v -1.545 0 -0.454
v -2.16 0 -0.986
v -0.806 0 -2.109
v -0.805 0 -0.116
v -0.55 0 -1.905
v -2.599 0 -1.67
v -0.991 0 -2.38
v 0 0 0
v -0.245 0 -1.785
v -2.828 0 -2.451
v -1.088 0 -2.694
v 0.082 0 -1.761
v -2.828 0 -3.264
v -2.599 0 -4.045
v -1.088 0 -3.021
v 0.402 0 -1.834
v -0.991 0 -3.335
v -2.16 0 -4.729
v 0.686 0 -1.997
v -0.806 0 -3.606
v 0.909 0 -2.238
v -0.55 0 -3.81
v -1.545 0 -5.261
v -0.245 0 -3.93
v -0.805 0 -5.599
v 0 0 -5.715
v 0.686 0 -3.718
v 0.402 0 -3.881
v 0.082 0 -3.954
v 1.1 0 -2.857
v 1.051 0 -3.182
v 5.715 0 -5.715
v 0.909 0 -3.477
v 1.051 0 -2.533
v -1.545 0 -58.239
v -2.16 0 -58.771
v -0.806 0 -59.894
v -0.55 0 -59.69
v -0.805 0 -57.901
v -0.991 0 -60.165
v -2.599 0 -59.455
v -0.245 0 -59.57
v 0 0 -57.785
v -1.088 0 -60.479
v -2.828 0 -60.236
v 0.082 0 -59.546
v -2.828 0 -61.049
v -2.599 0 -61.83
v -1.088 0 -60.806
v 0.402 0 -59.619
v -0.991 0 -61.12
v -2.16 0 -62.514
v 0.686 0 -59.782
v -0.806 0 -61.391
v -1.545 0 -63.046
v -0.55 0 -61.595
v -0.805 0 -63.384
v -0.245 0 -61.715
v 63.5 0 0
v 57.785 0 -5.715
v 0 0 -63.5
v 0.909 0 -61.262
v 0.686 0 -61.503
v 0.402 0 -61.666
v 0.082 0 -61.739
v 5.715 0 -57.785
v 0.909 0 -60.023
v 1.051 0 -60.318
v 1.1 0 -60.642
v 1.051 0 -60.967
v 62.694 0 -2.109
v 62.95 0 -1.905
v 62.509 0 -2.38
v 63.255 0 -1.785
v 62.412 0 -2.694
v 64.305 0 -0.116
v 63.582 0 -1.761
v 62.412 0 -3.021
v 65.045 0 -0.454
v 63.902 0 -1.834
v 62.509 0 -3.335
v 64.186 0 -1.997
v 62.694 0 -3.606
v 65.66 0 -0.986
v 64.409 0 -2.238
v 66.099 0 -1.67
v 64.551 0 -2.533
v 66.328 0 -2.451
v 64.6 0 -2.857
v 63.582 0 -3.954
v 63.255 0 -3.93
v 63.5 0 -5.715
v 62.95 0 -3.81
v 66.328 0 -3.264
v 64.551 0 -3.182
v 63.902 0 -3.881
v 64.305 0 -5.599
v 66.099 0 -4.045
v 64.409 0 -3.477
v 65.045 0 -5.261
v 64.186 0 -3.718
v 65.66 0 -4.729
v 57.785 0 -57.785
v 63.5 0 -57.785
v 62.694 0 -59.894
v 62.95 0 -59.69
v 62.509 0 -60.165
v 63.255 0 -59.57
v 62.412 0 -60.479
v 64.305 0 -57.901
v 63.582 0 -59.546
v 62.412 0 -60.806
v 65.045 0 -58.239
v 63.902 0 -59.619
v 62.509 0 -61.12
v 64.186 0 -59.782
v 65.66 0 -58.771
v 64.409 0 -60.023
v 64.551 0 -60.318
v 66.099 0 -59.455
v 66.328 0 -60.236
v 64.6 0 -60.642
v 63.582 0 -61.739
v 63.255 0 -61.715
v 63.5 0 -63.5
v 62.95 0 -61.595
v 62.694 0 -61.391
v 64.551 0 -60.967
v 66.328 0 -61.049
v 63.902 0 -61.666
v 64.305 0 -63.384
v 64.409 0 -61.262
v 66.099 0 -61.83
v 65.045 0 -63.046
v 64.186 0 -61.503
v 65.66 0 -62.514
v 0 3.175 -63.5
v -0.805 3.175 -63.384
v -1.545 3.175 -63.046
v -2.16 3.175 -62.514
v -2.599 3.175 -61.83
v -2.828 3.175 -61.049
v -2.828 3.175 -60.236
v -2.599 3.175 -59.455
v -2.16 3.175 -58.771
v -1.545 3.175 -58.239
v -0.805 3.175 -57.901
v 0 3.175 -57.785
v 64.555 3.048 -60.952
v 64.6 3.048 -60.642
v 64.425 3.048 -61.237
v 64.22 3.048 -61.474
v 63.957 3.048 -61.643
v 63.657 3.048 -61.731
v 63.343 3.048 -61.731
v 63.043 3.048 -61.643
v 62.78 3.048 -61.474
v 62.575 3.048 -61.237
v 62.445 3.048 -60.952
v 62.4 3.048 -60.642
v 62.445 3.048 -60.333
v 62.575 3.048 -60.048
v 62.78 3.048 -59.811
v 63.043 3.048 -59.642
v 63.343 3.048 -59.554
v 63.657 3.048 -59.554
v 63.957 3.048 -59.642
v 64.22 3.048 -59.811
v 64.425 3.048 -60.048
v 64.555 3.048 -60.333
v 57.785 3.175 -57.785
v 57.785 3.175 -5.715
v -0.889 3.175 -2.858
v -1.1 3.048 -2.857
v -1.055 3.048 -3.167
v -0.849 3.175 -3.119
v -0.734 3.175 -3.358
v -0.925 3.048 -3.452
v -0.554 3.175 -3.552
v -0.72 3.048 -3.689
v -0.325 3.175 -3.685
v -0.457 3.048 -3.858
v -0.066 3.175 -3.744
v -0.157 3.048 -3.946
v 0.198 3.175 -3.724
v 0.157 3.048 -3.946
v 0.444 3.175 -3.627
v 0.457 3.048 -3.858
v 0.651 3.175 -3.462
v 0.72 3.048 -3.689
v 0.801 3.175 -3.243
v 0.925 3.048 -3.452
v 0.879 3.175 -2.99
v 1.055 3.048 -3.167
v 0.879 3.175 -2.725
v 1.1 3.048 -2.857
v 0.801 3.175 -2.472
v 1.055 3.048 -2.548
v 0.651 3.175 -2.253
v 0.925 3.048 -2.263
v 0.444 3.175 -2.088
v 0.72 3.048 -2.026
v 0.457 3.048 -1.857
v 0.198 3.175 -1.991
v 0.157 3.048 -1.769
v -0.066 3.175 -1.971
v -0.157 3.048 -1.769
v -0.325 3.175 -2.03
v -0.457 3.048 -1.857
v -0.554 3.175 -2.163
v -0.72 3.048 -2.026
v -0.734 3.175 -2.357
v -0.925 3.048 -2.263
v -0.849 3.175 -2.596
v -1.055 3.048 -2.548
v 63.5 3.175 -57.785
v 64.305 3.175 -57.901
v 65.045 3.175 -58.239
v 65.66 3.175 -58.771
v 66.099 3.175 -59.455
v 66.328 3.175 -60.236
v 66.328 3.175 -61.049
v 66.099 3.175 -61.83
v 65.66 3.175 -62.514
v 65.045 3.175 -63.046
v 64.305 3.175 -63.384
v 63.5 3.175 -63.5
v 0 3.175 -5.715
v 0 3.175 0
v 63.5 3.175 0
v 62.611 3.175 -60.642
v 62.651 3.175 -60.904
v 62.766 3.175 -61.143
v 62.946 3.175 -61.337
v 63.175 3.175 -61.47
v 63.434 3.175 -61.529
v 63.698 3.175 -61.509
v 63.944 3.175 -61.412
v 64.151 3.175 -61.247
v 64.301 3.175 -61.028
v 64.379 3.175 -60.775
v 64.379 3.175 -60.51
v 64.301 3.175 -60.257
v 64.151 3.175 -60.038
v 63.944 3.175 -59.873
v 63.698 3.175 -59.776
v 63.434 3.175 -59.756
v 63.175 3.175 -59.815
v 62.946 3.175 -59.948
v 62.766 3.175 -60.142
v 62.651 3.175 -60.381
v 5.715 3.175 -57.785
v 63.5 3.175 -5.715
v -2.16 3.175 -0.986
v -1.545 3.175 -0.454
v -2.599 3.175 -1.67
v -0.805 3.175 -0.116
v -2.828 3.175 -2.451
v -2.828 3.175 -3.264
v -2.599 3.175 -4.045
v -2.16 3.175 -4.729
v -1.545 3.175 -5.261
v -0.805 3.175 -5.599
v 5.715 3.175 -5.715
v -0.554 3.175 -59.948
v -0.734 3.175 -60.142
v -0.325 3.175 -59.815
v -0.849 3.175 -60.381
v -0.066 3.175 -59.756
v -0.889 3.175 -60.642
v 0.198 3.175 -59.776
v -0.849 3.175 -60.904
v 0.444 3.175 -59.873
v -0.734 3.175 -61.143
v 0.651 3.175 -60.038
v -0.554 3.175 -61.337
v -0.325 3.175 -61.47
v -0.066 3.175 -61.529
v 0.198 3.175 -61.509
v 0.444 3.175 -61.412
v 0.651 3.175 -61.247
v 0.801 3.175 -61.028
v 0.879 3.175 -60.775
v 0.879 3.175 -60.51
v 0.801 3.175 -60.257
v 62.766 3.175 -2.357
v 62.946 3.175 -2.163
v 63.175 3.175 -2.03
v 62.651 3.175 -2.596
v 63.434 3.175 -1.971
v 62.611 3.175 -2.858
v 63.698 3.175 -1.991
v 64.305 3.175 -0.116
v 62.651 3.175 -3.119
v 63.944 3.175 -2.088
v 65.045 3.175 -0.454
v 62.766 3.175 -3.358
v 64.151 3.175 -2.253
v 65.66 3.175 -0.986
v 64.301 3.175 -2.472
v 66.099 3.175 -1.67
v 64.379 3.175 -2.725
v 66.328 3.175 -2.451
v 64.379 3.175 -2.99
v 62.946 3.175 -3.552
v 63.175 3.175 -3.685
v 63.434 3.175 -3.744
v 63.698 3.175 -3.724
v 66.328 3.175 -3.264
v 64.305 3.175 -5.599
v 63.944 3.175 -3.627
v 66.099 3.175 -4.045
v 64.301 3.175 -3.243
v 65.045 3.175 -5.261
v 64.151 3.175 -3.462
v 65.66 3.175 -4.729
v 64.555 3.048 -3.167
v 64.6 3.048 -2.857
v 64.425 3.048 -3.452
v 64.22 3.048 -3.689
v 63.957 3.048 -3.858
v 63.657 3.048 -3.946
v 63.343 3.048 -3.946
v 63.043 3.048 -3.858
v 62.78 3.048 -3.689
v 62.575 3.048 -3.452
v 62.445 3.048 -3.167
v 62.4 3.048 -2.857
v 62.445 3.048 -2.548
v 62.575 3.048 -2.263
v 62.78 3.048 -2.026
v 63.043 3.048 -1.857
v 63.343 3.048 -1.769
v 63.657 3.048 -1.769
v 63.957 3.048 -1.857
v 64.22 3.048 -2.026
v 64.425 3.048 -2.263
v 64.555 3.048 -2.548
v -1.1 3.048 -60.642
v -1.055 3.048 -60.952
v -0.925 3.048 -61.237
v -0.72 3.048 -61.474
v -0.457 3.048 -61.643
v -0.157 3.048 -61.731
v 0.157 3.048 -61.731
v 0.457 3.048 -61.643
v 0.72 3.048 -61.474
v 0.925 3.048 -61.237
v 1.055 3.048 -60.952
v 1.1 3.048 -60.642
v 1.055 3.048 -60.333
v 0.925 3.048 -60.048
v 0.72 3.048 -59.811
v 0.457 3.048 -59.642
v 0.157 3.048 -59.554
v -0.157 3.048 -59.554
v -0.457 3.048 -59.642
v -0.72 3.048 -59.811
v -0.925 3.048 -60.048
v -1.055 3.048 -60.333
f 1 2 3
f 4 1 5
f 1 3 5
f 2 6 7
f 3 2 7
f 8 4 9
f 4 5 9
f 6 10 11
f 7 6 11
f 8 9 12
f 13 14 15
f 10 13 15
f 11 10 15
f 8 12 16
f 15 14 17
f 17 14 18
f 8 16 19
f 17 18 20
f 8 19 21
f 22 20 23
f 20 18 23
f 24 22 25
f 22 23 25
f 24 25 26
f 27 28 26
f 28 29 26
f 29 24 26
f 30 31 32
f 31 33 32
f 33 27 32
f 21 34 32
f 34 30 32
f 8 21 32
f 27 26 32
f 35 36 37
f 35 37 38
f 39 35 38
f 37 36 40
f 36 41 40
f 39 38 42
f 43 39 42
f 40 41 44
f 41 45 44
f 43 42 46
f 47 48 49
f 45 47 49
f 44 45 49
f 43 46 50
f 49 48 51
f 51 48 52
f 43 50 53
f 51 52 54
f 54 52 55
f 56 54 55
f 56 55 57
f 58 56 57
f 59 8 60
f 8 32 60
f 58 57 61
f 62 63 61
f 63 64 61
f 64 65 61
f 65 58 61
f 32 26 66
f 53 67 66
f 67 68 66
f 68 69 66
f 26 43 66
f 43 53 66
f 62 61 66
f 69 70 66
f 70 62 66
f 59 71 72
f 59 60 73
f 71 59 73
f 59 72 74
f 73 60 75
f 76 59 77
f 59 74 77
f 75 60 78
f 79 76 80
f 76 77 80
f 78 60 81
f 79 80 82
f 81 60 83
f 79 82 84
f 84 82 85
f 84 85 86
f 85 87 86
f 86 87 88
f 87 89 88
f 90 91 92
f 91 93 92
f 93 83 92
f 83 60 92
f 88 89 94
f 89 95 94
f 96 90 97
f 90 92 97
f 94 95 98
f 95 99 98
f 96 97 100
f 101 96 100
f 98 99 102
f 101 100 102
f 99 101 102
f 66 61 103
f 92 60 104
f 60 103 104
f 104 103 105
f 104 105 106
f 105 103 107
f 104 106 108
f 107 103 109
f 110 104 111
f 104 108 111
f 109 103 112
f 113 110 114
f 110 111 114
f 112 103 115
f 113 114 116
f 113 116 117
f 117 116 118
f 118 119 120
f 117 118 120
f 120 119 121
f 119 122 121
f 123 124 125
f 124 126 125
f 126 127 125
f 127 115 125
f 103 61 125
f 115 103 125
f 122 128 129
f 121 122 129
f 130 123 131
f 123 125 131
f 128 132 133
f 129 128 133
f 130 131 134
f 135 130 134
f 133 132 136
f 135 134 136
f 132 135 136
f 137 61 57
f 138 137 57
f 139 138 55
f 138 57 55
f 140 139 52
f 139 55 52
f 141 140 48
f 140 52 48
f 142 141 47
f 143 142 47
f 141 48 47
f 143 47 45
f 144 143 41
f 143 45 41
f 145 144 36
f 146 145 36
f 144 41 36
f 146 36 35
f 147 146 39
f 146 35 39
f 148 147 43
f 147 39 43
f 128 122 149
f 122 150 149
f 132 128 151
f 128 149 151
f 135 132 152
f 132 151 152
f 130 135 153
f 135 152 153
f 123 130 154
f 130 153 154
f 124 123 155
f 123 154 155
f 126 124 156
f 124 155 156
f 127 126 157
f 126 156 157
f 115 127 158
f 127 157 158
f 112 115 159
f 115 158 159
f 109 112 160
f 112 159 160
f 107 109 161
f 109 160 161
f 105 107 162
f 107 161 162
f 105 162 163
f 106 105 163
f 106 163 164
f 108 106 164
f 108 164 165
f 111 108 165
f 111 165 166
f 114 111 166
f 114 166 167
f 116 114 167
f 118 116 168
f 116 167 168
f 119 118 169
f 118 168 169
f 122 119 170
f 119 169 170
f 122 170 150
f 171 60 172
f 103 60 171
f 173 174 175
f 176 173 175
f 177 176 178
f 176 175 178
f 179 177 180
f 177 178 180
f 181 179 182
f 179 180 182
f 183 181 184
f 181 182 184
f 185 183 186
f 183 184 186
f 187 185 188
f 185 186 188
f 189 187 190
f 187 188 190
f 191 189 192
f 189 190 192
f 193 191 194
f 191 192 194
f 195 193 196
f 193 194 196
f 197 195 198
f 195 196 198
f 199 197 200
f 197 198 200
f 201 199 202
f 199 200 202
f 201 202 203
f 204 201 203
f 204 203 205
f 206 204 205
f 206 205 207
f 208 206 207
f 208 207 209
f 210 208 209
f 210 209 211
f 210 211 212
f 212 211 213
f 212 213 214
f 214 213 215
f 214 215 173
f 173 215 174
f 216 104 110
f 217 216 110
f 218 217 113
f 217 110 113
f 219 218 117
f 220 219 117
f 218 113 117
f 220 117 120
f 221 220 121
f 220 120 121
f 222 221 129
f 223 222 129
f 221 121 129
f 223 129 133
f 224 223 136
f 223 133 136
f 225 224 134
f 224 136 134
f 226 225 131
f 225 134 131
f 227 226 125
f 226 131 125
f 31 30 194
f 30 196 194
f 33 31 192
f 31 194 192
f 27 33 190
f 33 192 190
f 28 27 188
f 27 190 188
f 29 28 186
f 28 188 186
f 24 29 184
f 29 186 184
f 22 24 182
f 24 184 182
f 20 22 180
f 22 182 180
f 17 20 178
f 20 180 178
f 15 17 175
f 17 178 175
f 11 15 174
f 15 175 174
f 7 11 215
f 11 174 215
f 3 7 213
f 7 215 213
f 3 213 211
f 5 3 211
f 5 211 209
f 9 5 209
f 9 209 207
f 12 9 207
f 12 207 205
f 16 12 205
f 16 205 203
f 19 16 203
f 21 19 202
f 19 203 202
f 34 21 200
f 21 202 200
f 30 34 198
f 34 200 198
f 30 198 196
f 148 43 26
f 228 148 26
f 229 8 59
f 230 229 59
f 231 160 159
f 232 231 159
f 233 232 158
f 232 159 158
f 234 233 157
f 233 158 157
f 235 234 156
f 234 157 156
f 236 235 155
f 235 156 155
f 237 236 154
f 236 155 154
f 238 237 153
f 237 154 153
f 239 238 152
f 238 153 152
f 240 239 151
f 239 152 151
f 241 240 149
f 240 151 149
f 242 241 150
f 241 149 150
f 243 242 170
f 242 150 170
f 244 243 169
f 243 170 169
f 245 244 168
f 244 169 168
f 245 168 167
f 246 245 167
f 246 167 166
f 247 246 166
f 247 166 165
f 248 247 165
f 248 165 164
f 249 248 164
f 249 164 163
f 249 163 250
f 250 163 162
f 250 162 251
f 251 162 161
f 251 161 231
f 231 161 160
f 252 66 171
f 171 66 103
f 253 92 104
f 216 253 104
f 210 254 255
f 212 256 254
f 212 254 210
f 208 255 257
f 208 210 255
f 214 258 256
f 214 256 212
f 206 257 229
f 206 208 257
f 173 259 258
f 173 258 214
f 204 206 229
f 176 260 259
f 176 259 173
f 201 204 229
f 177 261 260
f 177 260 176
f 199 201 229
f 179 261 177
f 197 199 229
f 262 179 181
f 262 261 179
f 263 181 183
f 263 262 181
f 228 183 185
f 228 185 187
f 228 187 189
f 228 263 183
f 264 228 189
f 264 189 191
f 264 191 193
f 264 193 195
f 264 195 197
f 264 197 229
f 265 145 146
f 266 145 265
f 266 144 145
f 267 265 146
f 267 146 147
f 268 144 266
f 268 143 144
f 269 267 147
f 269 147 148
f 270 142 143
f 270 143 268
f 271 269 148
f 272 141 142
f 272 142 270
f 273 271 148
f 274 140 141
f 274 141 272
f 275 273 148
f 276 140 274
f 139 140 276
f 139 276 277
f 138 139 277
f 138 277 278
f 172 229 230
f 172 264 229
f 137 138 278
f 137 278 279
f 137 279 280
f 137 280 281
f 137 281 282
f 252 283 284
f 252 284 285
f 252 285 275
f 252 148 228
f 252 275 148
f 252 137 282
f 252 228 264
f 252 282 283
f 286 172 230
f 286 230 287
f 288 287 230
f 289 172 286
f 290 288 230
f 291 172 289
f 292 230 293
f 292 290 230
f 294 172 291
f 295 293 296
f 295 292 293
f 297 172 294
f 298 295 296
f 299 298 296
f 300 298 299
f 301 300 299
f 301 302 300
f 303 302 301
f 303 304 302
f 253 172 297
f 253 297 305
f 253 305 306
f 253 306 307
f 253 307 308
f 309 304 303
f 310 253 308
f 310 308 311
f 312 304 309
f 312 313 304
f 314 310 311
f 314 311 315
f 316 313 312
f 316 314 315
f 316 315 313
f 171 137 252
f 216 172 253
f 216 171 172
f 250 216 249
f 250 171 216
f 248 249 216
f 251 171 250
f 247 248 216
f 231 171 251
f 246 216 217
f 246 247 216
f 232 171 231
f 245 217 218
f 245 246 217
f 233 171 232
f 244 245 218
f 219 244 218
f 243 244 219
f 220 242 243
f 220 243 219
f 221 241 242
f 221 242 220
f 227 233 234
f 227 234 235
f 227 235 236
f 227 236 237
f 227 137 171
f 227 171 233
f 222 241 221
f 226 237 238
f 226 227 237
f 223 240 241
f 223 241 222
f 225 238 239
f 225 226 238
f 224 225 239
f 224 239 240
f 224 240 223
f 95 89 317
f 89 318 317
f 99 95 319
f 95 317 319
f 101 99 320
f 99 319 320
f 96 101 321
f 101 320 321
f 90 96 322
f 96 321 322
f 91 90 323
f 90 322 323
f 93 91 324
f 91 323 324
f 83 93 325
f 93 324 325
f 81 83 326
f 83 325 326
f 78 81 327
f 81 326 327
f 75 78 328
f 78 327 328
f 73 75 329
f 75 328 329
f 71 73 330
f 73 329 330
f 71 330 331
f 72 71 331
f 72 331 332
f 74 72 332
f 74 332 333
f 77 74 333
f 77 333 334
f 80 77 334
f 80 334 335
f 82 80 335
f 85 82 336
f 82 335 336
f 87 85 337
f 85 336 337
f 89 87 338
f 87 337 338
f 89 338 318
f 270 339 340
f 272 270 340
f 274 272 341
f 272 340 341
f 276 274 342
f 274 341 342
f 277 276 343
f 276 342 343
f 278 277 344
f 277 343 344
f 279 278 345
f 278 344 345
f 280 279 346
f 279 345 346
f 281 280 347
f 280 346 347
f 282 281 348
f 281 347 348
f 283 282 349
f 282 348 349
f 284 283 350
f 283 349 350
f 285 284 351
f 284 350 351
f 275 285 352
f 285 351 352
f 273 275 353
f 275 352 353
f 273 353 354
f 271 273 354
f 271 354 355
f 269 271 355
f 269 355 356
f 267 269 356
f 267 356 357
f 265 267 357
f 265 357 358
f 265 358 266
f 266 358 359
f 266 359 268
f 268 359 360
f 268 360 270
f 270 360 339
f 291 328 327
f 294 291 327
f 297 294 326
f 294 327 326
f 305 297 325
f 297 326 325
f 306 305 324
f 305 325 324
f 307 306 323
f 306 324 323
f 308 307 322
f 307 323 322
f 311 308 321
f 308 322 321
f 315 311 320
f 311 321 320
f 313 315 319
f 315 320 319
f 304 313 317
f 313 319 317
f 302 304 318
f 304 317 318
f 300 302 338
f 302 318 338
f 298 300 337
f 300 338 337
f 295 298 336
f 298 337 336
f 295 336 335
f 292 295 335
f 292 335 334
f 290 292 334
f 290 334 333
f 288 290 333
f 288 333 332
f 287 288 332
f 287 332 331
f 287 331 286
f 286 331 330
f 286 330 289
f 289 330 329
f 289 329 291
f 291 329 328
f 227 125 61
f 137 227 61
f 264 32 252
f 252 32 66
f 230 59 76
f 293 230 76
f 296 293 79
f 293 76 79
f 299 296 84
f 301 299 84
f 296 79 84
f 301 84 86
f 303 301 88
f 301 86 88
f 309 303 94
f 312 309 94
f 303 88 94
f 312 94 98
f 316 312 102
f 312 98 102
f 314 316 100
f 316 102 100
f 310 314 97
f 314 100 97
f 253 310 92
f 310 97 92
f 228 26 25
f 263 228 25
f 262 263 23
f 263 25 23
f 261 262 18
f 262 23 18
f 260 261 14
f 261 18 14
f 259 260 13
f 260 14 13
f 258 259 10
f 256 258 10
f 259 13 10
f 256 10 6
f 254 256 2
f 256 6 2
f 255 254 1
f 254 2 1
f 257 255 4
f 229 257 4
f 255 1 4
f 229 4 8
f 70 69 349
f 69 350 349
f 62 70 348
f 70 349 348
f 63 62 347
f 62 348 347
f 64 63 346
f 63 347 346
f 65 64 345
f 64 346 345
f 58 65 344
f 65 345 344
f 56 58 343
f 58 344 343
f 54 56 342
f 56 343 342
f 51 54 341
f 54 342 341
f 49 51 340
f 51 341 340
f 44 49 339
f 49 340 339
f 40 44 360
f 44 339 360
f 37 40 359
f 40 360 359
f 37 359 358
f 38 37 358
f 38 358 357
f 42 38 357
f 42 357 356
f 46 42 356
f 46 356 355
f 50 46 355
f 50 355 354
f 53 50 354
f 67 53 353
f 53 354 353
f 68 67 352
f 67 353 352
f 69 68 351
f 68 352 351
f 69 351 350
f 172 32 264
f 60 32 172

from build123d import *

# Parameters (mm, degrees)
SKETCH1_W                = 52.07
SKETCH1_H                = 52.07
BOSS_EXTRUDE1_DEPTH      = 3.175
M2_CLEARANCE_HOLE1_D     = 2.2
M2_CLEARANCE_HOLE1_DEPTH = 3.048
M2_CLEARANCE_HOLE1_TIP   = 0.660946681


with BuildPart() as part:
    # Sketch1 → Boss-Extrude1 (new body)
    with BuildSketch(Plane(origin=(0, 0, 0), x_dir=(1, 0, 0), z_dir=(0, 1, 0))):
        with BuildLine():
            Line((0, 0), (63.5, 0))
            ThreePointArc((63.5, 0), (66.3575, 2.8575), (63.5, 5.715))
            Line((63.5, 5.715), (63.5, 57.785))
            ThreePointArc((63.5, 57.785), (66.3575, 60.6425), (63.5, 63.5))
            Line((63.5, 63.5), (0, 63.5))
            ThreePointArc((0, 63.5), (-2.8575, 60.6425), (0, 57.785))
            Line((0, 57.785), (0, 5.715))
            ThreePointArc((0, 5.715), (-2.8575, 2.8575), (0, 0))
        make_face()
        with Locations((31.75, 31.75)):
            Rectangle(SKETCH1_W, SKETCH1_H, mode=Mode.SUBTRACT)
    extrude(amount=BOSS_EXTRUDE1_DEPTH)

    # M2 Clearance Hole1
    with Locations(Plane(origin=(0, 0, 0), x_dir=(-1, 0, 0), z_dir=(0, -1, 0))):
        with Locations((-63.5, 60.6425), (0, 60.6425), (0, 2.8575), (-63.5, 2.8575)):
            Hole(M2_CLEARANCE_HOLE1_D / 2, depth=M2_CLEARANCE_HOLE1_DEPTH)
            with Locations((0, 0, -(M2_CLEARANCE_HOLE1_DEPTH + M2_CLEARANCE_HOLE1_TIP / 2))):  # 118° drill point
                Cone(0, M2_CLEARANCE_HOLE1_D / 2, M2_CLEARANCE_HOLE1_TIP, mode=Mode.SUBTRACT)


solid = part.part
